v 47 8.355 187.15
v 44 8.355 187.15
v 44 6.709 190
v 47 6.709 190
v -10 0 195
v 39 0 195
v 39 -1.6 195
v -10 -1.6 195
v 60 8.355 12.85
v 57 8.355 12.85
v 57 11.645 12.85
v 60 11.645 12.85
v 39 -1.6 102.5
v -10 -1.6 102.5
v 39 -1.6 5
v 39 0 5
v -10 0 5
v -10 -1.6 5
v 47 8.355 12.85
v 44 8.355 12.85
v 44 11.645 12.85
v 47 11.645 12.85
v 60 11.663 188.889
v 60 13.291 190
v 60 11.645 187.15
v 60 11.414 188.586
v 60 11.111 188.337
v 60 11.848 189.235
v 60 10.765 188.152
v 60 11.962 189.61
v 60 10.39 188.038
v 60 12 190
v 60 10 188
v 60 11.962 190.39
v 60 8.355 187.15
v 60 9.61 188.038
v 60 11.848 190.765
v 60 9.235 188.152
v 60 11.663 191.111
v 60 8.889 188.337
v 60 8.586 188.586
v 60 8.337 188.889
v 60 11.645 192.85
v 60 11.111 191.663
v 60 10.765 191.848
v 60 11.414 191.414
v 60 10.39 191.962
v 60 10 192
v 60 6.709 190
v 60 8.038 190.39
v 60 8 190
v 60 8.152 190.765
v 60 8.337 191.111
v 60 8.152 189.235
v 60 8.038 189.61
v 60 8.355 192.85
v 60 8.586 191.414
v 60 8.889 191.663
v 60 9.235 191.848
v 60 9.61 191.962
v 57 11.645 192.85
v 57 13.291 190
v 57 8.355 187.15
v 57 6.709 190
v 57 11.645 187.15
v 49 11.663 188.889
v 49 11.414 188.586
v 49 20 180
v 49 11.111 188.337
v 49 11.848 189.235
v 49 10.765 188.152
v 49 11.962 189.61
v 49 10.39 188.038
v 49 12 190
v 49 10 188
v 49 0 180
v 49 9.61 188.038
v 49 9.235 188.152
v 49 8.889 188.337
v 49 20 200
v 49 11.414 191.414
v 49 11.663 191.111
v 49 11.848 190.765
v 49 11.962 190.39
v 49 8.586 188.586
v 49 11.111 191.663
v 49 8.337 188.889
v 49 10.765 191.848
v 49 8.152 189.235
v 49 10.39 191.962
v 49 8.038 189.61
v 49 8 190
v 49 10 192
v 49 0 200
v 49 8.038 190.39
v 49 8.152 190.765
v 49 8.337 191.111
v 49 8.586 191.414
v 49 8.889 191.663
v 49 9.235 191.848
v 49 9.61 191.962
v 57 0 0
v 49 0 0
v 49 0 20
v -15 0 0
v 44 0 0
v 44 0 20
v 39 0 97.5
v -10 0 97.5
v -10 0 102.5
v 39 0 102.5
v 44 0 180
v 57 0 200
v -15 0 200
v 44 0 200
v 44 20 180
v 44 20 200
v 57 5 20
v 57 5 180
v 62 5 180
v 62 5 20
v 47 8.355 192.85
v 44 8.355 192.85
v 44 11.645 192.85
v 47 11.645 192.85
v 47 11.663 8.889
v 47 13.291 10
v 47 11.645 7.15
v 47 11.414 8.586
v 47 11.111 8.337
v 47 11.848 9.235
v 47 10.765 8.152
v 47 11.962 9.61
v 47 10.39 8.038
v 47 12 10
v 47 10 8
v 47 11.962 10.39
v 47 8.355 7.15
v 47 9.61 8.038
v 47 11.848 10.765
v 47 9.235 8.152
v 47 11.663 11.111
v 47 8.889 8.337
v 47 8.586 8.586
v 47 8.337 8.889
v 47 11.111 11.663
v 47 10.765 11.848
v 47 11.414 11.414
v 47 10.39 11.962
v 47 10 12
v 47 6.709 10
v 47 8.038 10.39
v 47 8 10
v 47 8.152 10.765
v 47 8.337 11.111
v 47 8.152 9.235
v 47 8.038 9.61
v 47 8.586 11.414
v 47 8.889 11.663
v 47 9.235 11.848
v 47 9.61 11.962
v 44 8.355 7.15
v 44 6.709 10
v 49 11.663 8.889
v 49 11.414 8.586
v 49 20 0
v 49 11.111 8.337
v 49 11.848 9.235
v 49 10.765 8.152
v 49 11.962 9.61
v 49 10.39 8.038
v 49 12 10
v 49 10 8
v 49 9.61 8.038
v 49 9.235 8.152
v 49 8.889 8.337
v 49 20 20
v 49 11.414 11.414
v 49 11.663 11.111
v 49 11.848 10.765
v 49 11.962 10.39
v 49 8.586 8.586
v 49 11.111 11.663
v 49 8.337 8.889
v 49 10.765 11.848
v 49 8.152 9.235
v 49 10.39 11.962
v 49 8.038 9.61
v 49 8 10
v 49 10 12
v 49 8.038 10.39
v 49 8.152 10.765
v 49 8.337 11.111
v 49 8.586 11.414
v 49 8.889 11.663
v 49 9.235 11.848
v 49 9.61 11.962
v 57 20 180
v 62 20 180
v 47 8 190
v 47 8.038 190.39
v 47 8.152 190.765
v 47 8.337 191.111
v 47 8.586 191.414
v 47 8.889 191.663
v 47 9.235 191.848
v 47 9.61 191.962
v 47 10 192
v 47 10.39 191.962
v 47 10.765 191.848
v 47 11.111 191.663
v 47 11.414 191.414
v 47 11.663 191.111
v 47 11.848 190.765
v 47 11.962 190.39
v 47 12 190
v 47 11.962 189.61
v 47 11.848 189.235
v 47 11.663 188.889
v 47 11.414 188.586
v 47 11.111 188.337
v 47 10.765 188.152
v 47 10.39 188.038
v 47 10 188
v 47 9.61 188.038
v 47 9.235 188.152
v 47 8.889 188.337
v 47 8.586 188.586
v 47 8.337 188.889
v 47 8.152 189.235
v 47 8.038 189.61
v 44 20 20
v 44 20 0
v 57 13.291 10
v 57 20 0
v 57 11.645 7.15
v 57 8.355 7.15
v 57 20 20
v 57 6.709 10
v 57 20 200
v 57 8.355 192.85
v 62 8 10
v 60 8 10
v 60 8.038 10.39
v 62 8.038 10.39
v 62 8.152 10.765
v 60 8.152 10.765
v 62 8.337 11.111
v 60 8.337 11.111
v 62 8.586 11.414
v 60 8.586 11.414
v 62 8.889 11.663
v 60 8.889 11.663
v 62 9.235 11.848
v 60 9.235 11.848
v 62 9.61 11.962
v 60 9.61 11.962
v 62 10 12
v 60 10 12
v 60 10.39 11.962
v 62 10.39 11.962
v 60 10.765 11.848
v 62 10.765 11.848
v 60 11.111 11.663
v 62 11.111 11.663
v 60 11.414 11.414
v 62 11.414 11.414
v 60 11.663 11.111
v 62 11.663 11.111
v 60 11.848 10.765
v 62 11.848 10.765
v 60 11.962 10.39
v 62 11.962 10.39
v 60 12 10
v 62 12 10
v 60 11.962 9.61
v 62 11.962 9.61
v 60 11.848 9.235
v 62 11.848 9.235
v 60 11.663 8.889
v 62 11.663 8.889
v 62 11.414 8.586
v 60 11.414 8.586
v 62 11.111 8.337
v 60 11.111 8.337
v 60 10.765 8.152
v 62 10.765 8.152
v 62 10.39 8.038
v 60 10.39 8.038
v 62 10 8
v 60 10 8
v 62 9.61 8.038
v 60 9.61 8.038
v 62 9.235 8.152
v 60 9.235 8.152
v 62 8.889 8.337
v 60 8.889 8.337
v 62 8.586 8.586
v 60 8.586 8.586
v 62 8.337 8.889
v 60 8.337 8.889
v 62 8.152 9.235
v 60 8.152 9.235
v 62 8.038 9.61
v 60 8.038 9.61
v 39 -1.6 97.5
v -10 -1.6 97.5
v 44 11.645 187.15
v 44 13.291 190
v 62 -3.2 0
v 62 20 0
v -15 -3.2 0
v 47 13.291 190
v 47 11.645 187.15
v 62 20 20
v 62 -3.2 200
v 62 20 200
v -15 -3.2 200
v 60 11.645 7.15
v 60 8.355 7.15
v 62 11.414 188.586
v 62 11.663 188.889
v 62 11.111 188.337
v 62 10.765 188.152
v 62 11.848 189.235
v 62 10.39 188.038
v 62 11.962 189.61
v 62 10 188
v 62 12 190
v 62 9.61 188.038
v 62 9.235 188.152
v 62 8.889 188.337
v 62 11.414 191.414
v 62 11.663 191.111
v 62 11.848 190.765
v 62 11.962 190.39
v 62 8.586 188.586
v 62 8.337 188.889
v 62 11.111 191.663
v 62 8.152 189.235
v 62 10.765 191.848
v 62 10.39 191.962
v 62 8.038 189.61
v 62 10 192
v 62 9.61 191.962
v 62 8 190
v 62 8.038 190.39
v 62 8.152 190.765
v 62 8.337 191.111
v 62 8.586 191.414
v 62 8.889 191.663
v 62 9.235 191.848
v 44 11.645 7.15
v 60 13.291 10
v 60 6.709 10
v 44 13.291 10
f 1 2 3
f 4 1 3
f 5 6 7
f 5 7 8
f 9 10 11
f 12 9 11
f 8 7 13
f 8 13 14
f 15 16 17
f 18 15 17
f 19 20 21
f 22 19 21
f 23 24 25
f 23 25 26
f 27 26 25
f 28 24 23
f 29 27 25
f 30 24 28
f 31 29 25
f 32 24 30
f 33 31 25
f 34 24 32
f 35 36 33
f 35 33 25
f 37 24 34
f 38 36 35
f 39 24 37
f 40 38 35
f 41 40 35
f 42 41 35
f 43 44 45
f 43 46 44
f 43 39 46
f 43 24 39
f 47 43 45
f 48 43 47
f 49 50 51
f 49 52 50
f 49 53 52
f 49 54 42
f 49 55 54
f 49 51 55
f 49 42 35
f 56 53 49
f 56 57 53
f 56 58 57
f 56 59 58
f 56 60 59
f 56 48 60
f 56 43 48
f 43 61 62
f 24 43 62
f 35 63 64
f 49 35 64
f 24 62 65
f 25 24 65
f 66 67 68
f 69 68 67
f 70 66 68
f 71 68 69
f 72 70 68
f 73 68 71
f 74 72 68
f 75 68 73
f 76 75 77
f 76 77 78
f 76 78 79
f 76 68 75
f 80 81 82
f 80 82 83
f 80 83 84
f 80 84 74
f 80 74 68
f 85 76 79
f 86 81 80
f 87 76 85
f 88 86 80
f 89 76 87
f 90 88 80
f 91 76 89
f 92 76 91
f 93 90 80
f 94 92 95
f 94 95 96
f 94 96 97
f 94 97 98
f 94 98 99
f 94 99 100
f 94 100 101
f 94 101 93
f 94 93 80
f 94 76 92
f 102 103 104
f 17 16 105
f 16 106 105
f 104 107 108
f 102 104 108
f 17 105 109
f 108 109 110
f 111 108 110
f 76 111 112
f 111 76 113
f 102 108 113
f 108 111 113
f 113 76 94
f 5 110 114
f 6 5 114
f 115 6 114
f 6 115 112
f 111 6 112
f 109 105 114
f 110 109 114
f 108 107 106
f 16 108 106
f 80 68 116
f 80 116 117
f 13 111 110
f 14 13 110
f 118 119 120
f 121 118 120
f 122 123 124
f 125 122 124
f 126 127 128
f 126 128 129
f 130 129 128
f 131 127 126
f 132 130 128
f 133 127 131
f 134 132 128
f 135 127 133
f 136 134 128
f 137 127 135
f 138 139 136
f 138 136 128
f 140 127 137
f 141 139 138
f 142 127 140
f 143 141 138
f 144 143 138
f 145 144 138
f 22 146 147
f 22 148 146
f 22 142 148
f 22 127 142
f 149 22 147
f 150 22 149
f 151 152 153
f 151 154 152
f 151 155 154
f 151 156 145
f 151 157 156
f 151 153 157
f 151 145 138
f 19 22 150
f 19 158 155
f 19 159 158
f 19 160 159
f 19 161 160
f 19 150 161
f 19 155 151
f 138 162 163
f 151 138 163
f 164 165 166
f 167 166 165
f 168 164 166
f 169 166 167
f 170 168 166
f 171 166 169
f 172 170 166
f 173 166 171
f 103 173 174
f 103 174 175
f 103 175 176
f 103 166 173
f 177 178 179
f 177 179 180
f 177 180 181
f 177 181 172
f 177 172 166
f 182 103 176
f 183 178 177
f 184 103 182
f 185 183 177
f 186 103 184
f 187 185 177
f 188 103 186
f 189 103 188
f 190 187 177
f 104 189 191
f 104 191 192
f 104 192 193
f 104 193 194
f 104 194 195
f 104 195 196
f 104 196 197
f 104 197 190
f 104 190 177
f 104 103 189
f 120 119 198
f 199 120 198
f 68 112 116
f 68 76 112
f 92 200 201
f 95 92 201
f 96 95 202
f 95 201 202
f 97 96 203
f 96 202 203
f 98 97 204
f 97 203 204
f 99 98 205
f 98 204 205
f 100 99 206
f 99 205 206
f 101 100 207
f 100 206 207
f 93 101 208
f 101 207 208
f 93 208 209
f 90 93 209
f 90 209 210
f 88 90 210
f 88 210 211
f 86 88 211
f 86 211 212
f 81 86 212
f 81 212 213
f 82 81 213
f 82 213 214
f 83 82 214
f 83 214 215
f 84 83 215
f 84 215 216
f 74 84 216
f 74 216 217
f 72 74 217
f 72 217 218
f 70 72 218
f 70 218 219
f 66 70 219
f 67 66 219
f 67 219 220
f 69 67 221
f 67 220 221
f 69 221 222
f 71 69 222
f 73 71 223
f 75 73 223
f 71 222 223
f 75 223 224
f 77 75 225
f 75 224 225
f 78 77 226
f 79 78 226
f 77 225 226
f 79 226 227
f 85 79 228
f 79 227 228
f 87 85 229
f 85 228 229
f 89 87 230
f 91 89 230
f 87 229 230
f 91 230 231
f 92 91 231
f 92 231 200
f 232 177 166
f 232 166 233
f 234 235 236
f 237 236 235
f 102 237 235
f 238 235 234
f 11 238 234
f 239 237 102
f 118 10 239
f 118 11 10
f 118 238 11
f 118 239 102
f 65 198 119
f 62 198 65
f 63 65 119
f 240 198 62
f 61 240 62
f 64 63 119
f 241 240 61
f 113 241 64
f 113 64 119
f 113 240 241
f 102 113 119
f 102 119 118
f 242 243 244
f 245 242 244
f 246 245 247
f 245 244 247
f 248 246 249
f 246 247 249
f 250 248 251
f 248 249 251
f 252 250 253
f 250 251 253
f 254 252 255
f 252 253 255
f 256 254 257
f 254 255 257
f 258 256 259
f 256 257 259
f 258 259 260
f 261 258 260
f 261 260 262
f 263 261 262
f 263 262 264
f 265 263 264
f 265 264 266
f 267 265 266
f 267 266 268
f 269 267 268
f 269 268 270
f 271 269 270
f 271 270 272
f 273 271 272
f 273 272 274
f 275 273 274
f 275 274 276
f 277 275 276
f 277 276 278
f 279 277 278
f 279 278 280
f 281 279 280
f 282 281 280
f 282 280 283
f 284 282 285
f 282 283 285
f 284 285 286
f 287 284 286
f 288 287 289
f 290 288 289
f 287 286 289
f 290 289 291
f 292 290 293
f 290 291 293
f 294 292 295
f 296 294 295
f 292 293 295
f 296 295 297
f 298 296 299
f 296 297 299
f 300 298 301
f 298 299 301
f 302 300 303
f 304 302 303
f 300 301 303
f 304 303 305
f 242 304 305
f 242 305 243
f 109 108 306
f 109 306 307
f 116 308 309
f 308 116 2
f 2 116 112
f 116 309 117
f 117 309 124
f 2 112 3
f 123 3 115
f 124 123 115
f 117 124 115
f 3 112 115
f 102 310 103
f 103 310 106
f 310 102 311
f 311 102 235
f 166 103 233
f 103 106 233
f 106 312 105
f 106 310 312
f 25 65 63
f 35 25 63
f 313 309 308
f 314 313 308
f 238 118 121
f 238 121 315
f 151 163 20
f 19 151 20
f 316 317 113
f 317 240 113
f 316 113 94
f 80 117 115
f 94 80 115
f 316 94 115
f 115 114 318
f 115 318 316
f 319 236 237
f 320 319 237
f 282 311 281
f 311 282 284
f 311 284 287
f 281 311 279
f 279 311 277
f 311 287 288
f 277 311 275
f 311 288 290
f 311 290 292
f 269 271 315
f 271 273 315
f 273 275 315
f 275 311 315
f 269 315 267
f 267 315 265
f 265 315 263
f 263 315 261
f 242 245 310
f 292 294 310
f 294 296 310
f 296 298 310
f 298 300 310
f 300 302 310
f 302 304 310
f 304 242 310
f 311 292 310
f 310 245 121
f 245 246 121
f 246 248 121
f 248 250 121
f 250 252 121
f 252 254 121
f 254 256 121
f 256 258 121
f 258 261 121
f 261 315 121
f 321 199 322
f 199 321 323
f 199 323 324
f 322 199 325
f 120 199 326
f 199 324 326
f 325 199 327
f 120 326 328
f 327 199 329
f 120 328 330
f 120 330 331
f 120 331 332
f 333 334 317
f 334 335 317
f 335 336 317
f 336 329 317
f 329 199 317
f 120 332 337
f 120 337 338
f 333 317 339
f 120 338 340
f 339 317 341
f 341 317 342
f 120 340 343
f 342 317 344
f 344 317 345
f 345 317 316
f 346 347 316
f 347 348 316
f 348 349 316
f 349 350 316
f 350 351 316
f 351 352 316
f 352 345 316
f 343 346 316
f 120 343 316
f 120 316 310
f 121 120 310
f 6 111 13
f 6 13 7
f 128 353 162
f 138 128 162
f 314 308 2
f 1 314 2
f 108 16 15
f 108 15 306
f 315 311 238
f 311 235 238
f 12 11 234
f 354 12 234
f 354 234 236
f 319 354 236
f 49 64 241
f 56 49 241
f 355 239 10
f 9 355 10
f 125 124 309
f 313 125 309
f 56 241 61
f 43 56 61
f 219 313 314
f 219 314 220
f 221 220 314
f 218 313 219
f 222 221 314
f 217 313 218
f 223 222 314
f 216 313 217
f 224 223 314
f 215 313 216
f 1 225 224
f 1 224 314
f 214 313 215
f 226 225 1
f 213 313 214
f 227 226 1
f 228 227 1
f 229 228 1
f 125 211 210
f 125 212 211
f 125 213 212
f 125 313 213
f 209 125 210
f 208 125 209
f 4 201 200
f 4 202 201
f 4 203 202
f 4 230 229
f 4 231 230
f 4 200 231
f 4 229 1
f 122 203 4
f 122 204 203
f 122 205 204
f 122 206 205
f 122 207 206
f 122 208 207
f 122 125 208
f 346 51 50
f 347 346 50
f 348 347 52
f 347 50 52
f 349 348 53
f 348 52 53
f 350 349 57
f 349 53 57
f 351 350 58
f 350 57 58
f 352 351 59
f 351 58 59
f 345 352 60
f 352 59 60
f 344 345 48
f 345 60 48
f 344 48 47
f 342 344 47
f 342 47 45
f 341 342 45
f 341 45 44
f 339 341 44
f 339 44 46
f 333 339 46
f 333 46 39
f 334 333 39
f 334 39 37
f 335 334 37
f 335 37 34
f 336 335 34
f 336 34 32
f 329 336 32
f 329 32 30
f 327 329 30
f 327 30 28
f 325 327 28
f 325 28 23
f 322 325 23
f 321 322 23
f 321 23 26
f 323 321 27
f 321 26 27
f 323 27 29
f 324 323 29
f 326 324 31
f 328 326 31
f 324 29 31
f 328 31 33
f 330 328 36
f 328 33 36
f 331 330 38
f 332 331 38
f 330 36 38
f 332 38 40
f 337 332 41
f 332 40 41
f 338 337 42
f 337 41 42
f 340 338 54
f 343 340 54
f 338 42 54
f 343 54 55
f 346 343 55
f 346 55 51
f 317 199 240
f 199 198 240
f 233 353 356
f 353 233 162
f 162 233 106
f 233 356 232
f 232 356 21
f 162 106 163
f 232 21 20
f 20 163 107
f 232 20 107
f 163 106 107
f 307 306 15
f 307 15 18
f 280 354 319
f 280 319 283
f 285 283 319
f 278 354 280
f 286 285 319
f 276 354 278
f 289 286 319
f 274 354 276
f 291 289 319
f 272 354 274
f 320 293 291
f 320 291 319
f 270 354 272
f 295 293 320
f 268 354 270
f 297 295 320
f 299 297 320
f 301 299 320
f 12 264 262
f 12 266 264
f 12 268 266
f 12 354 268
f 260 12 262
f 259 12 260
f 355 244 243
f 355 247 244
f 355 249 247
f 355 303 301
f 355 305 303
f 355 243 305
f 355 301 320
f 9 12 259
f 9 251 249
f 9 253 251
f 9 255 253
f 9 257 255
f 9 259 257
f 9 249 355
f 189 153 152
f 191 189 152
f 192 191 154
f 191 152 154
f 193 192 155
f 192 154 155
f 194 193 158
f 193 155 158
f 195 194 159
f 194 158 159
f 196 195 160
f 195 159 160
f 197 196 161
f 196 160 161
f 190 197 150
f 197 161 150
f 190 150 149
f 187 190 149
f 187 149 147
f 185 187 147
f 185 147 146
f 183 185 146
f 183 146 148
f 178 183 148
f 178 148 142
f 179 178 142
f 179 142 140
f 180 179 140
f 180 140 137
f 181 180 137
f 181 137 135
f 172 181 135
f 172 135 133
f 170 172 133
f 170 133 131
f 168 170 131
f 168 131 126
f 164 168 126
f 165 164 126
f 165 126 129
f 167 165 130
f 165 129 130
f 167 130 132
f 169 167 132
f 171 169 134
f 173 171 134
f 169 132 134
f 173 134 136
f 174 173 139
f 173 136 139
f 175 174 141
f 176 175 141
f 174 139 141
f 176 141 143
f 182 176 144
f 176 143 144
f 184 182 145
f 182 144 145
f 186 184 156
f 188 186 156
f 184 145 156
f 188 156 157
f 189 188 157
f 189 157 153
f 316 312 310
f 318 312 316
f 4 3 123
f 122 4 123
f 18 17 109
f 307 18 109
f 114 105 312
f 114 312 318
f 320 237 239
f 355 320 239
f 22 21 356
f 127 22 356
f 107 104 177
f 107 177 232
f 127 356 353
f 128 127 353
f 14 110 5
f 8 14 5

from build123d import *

# Parameters (mm, degrees)
F0_W      = 60
F0_H      = 200
F1_DEPTH  = 3.2
F2_W      = 3
F2_H      = 20
F3_DEPTH  = 20
F5_DEPTH  = 15
F6_DEPTH  = 2
F7_DEPTH  = 2
F8_R      = 2
F9_DEPTH  = 3
F10_DEPTH = 25
F11_R     = 2
F12_DEPTH = 3
F13_DEPTH = 25
F14_W     = 5
F14_H     = 5
F15_DEPTH = 160
F16_W     = 49
F16_H     = 92.5
F17_DEPTH = 1.6


with BuildPart() as f1:
    # F0 (on Front) → F1 (new body)
    with BuildSketch(Plane.XZ):
        with Locations((30, 100)):
            Rectangle(F0_W, F0_H)
    extrude(amount=F1_DEPTH)

    # F2 (on face) → F3 (join)
    with BuildSketch(Plane(origin=(0, 0, 0), x_dir=(-1, 0, 0), z_dir=(0, 1, 0))):
        with Locations((-58.5, 190)):
            Rectangle(F2_W, F2_H)
        with Locations((-58.5, 10)):
            Rectangle(F2_W, F2_H)
        with Locations((-47.5, 190)):
            Rectangle(F2_W, F2_H)
        with Locations((-47.5, 10)):
            Rectangle(F2_W, F2_H)
    extrude(amount=F3_DEPTH)

    # F5 (add): a face of the model
    f5_faces = [f1.faces().sort_by_distance(p)[0] for p in [
        (0, -1.6, 100),
    ]]
    extrude(f5_faces, amount=F5_DEPTH)

    # F6 (add): a face of the model
    f6_faces = [f1.faces().sort_by_distance(p)[0] for p in [
        (60, -1.186588964, 100),
    ]]
    extrude(f6_faces, amount=F6_DEPTH)

    # F7 (add): faces of the model
    f7_faces = [f1.faces().sort_by_distance(p)[0] for p in [
        (46, 10, 190),
        (46, 10, 10),
    ]]
    extrude(f7_faces, amount=F7_DEPTH)

    # F8 (on face) → F9 (cut)
    with BuildSketch(Plane(origin=(57, 0, 0), x_dir=(0, -1, 0), z_dir=(-1, 0, 0))):
        Polygon((-6.7091034656, 10), (-8.3545517328, 12.85), (-11.6454482672, 12.85), (-13.2908965344, 10), (-11.6454482672, 7.15), (-8.3545517328, 7.15), align=None)
        with Locations((-10, 10)):
            Circle(F8_R, mode=Mode.SUBTRACT)
        Polygon((-11.6454482672, 187.15), (-8.3545517328, 187.15), (-6.7091034656, 190), (-8.3545517328, 192.85), (-11.6454482672, 192.85), (-13.2908965344, 190), align=None)
        with Locations((-10, 190)):
            Circle(F8_R, mode=Mode.SUBTRACT)
    extrude(amount=-F9_DEPTH, mode=Mode.SUBTRACT)

    # F10 (cut): faces of the model
    f10_faces = [f1.faces().sort_by_distance(p)[0] for p in [
        (57, 10, 10),
        (57, 10, 190),
    ]]
    extrude(f10_faces, amount=-F10_DEPTH, mode=Mode.SUBTRACT)

    # F11 (on face) → F12 (cut)
    with BuildSketch(Plane(origin=(44, 0, 0), x_dir=(0, -1, 0), z_dir=(-1, 0, 0))):
        Polygon((-6.7091034656, 10), (-8.3545517328, 12.85), (-11.6454482672, 12.85), (-13.2908965344, 10), (-11.6454482672, 7.15), (-8.3545517328, 7.15), align=None)
        with Locations((-10, 10)):
            Circle(F11_R, mode=Mode.SUBTRACT)
        Polygon((-11.6454482672, 187.15), (-8.3545517328, 187.15), (-6.7091034656, 190), (-8.3545517328, 192.85), (-11.6454482672, 192.85), (-13.2908965344, 190), align=None)
        with Locations((-10, 190)):
            Circle(F11_R, mode=Mode.SUBTRACT)
    extrude(amount=-F12_DEPTH, mode=Mode.SUBTRACT)

    # F13 (cut): faces of the model
    f13_faces = [f1.faces().sort_by_distance(p)[0] for p in [
        (44, 10, 190),
        (44, 10, 10),
    ]]
    extrude(f13_faces, amount=-F13_DEPTH, mode=Mode.SUBTRACT)

    # F14 (on face) → F15 (join, through all)
    with BuildSketch(Plane(origin=(0, 0, 180), x_dir=(1, 0, 0), z_dir=(0, 0, -1))):
        with Locations((59.5, -2.5)):
            Rectangle(F14_W, F14_H)
    extrude(amount=F15_DEPTH)

    # F16 (on face) → F17 (cut)
    with BuildSketch(Plane(origin=(0, 0, 0), x_dir=(-1, 0, 0), z_dir=(0, 1, 0))):
        with Locations((-14.5, 51.25)):
            Rectangle(F16_W, F16_H)
        with Locations((-14.5, 148.75)):
            Rectangle(F16_W, F16_H)
    extrude(amount=-F17_DEPTH, mode=Mode.SUBTRACT)


solid = f1.part
